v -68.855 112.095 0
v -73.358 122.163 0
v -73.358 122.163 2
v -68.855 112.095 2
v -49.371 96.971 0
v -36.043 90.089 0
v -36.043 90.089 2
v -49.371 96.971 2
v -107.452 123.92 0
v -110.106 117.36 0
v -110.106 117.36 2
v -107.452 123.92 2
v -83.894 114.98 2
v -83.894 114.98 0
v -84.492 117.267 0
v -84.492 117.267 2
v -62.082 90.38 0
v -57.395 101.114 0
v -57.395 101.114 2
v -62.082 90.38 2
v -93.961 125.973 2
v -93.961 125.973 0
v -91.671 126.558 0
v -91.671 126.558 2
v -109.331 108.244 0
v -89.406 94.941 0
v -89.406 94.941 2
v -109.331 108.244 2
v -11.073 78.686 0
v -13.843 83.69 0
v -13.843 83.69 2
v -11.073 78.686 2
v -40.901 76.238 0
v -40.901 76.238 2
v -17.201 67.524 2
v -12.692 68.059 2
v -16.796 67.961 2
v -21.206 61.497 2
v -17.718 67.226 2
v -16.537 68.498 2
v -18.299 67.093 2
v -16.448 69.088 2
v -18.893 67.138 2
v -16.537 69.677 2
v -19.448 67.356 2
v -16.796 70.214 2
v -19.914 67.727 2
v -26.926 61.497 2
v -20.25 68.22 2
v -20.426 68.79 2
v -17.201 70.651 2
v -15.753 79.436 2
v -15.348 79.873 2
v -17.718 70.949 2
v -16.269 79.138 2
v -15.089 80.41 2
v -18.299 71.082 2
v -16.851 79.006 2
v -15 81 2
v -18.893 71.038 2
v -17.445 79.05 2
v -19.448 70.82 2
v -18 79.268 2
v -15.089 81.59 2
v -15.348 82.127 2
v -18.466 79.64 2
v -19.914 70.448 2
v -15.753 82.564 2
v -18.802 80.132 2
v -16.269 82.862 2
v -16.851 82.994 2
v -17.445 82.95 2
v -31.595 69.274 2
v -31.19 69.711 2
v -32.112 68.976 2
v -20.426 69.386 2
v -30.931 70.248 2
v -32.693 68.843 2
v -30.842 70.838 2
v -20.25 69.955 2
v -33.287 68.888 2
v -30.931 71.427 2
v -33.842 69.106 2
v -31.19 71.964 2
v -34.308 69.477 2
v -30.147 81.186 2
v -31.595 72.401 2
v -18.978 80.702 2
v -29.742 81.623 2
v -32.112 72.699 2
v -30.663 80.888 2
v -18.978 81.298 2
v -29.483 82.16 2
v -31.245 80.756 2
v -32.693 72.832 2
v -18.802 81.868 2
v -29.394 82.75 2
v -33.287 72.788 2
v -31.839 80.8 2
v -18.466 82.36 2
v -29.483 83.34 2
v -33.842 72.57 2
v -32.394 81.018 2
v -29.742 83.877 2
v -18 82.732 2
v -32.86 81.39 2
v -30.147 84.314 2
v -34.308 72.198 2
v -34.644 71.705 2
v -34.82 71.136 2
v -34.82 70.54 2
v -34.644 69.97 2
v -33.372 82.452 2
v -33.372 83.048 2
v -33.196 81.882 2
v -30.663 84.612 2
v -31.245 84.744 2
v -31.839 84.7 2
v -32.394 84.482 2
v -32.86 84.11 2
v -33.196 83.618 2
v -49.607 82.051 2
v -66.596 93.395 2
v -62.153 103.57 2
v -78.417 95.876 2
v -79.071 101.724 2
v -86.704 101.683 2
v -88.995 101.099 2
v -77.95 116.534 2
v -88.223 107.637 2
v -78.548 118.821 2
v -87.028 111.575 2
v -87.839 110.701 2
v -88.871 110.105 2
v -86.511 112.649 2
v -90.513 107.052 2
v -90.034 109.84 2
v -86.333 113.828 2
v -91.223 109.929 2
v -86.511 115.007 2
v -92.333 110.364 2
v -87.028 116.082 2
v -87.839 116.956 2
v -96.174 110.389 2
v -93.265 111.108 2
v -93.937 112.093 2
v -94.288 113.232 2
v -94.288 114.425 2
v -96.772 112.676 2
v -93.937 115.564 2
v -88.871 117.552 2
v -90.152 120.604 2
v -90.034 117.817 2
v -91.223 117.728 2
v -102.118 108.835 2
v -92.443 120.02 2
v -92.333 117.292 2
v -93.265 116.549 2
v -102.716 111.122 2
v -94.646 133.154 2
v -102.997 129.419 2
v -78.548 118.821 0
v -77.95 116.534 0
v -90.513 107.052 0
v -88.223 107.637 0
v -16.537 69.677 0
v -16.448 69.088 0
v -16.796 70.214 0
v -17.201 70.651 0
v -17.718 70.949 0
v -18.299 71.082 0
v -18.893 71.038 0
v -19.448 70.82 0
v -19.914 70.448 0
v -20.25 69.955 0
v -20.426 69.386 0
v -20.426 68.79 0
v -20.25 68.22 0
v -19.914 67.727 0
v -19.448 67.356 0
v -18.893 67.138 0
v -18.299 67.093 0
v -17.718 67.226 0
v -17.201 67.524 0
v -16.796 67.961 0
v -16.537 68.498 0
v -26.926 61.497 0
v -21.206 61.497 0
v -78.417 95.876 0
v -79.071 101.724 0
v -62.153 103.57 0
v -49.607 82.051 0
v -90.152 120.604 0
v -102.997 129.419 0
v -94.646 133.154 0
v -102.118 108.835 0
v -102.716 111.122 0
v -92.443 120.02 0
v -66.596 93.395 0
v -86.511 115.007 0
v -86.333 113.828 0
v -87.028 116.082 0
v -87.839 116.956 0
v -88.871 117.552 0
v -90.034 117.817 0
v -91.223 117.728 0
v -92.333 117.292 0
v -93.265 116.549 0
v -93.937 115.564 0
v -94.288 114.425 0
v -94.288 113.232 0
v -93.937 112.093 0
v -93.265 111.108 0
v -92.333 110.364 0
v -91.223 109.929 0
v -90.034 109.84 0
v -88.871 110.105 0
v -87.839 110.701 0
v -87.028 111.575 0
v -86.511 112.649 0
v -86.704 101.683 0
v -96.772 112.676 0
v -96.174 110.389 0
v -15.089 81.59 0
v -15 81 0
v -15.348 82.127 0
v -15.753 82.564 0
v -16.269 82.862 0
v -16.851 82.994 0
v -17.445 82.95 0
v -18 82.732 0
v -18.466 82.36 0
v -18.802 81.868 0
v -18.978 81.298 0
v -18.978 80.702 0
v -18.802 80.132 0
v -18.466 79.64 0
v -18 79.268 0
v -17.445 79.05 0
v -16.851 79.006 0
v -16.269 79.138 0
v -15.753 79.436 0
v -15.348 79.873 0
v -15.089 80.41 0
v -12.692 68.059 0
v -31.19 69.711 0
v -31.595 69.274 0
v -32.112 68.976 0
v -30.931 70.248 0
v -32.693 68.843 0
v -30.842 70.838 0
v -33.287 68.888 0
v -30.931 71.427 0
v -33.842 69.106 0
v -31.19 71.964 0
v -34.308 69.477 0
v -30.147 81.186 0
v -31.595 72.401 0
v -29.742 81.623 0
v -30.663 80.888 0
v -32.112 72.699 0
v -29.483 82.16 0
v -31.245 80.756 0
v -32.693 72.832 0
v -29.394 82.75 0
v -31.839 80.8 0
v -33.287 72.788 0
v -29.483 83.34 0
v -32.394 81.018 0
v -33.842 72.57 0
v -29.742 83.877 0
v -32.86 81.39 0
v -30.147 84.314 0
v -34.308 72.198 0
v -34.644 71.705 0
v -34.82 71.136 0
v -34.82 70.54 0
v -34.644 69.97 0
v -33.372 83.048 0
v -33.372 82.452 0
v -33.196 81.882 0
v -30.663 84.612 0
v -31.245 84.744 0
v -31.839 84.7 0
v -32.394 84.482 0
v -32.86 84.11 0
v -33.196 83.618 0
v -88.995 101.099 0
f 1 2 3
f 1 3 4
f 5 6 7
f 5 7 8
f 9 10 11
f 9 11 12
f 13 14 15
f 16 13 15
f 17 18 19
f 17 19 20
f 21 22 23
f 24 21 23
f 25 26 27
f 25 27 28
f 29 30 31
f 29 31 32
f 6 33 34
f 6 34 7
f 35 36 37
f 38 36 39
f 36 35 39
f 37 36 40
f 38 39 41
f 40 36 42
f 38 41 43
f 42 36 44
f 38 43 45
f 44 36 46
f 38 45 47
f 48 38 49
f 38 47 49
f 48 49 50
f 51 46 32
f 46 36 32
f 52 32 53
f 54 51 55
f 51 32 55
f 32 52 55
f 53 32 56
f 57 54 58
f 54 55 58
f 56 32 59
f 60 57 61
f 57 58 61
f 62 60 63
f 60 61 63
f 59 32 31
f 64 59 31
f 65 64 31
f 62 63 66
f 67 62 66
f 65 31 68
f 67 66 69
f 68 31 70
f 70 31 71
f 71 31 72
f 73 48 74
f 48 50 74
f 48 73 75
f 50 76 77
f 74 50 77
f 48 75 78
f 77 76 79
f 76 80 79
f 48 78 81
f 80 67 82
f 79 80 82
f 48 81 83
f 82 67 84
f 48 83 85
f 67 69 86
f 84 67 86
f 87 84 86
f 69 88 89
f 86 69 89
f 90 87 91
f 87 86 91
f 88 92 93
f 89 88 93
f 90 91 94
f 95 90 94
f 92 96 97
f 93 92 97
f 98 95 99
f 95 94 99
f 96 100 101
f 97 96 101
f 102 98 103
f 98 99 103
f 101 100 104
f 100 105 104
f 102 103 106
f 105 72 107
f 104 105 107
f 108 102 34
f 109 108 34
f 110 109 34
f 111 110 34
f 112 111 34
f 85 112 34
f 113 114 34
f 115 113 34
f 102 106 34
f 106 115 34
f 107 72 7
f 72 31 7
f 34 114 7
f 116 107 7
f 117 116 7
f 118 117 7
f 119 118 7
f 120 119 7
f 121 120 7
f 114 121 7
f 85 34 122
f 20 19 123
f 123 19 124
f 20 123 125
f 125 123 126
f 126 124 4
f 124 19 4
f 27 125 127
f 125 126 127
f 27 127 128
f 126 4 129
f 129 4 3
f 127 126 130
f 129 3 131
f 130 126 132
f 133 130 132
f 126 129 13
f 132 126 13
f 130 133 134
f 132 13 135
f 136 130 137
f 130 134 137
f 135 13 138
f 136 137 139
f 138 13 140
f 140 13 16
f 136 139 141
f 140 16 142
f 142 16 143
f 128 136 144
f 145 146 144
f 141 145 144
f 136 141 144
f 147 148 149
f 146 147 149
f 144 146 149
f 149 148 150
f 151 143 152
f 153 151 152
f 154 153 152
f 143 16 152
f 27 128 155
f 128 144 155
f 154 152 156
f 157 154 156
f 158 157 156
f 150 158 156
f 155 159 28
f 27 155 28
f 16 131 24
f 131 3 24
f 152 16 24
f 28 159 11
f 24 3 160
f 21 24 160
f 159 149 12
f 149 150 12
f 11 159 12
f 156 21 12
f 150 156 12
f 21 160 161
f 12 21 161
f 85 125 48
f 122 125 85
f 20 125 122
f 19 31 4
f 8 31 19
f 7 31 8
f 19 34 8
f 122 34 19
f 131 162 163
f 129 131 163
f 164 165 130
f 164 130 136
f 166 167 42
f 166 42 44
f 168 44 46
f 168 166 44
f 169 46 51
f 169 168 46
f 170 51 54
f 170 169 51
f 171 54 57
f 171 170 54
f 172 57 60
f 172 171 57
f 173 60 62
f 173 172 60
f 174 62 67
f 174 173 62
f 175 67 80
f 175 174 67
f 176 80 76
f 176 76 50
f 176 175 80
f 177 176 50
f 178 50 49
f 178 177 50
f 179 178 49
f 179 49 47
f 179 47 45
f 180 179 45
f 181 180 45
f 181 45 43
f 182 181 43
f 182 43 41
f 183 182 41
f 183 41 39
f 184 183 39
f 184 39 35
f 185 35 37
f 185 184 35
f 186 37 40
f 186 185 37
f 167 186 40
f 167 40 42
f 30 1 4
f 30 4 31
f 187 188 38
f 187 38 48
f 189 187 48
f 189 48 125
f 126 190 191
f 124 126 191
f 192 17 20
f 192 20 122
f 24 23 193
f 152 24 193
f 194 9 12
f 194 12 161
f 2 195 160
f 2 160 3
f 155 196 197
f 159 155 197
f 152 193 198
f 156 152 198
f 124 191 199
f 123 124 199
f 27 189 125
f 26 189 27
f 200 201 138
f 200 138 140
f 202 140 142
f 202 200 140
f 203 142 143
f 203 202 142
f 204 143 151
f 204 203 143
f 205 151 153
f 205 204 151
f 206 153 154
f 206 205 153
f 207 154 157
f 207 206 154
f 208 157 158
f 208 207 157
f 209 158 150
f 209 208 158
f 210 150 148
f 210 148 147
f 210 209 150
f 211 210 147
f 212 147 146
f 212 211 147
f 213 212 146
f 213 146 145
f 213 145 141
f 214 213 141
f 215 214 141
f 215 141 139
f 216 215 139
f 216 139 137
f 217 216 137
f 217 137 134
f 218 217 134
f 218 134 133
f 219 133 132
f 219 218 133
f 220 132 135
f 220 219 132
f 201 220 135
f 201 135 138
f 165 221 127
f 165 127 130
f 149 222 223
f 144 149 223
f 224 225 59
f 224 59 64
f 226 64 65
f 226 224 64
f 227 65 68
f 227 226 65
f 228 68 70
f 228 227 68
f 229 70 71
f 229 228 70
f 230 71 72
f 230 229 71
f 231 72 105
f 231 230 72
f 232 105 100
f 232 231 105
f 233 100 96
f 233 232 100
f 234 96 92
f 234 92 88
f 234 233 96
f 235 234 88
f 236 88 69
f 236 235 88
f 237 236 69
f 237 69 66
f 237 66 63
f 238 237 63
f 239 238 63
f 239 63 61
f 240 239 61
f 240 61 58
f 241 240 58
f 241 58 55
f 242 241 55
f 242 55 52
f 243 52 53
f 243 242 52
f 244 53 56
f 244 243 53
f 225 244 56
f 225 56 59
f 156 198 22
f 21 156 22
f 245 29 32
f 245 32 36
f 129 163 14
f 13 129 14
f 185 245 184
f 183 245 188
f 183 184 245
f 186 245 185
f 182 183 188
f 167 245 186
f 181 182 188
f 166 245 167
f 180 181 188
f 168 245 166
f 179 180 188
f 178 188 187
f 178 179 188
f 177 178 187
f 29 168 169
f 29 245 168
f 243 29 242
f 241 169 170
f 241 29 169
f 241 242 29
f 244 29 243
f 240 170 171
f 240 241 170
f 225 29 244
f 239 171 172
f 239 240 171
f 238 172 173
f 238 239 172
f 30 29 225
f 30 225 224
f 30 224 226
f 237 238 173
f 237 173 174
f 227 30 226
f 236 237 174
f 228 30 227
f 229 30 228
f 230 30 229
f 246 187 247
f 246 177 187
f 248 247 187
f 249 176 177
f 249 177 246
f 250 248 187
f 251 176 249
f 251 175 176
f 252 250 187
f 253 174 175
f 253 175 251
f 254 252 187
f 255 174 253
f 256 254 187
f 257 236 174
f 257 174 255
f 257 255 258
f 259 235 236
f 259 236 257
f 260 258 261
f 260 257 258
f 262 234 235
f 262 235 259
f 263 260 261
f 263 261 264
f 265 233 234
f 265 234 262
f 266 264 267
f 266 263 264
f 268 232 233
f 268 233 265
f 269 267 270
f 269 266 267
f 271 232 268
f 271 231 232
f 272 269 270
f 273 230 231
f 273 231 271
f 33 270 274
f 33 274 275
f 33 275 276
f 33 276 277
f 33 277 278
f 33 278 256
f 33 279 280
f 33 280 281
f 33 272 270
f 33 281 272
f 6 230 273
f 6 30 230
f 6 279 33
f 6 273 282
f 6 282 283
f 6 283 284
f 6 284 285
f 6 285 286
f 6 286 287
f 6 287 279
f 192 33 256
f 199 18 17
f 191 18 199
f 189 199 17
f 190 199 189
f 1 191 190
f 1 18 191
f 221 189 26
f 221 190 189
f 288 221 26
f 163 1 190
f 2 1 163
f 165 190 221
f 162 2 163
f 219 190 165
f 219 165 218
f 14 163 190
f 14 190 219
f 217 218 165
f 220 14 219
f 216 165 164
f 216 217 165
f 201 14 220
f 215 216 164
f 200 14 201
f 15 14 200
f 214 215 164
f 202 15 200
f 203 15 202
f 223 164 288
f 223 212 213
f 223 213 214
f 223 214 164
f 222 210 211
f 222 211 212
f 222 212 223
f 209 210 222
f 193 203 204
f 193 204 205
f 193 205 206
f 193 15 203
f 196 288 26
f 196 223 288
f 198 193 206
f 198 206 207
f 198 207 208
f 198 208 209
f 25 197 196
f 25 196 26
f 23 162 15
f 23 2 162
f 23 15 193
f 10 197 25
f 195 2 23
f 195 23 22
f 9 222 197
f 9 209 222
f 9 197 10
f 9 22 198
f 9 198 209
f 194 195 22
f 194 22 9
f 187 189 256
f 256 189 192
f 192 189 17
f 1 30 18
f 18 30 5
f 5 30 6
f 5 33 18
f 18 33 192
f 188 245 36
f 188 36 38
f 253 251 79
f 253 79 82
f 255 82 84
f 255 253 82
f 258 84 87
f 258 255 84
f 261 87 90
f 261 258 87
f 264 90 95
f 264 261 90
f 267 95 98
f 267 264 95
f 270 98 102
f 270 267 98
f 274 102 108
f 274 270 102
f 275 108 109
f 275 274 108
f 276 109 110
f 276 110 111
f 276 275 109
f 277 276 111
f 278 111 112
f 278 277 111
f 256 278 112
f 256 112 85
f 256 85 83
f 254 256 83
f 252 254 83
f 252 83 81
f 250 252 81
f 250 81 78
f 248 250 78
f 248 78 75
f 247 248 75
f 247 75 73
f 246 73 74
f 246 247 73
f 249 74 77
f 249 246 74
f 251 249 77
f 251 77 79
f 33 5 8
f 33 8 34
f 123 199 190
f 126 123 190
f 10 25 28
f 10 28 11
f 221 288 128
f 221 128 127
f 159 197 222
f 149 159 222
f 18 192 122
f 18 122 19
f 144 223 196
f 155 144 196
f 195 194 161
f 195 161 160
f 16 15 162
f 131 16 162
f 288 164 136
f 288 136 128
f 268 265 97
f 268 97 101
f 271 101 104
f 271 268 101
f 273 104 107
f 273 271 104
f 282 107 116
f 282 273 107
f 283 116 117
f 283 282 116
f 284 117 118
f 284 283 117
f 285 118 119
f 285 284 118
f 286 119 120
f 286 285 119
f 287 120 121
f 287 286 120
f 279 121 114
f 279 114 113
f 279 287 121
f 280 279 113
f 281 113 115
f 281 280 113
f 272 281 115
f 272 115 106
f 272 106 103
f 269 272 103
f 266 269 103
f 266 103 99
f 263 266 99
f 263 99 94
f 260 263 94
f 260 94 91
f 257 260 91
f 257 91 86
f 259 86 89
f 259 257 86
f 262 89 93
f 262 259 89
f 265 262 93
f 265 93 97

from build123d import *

# Parameters (mm, degrees)
SKETCH1_R           = 4
SKETCH1_R_2         = 2
BOSS_EXTRUDE1_DEPTH = 2
CUT_EXTRUDE1_DEPTH  = 173.793238563


with BuildPart() as part:
    # Sketch1 → Boss-Extrude1 (new body)
    with BuildSketch(Plane.XY):
        Polygon((-12.69170221, 68.058974673), (-21.206087924, 61.497173254), (-26.925864701, 61.497173254), (-78.416756166, 95.875975746), (-89.405776689, 94.940877802), (-109.330638194, 108.244063256), (-110.106321881, 117.359690148), (-107.452090358, 123.920131464), (-102.997288795, 129.41913849), (-94.646003522, 133.154426043), (-73.358414132, 122.162911716), (-68.855470773, 112.095316109), (-13.842945112, 83.690457631), (-11.073314648, 78.685960307), align=None)
        with Locations((-90.332829692, 113.828343926)):
            Circle(SKETCH1_R, mode=Mode.SUBTRACT)
        with Locations((-18.448275862, 69.087716549)):
            Circle(SKETCH1_R_2, mode=Mode.SUBTRACT)
        with Locations((-32.842285033, 70.837716549)):
            Circle(SKETCH1_R_2, mode=Mode.SUBTRACT)
        with Locations((-31.39400917, 82.75)):
            Circle(SKETCH1_R_2, mode=Mode.SUBTRACT)
        with Locations((-17, 81)):
            Circle(SKETCH1_R_2, mode=Mode.SUBTRACT)
        Polygon((-102.715959344, 111.122206654), (-96.771854102, 112.676201947), (-96.173964404, 110.389245671), (-102.118069647, 108.835250378), align=None, mode=Mode.SUBTRACT)
        Polygon((-91.670790351, 126.557551491), (-90.152197928, 120.604303172), (-92.442671943, 120.0200345), (-93.961264367, 125.97328282), align=None, mode=Mode.SUBTRACT)
        Polygon((-77.94970004, 116.534481198), (-83.893805282, 114.980485905), (-84.49169498, 117.267442181), (-78.547589737, 118.821437474), align=None, mode=Mode.SUBTRACT)
        Polygon((-88.222987441, 107.636653352), (-90.513461456, 107.052384681), (-88.994869033, 101.099136361), (-86.704395017, 101.683405032), align=None, mode=Mode.SUBTRACT)
    extrude(amount=BOSS_EXTRUDE1_DEPTH)

    # Sketch5 → Cut-Extrude1 (cut, through all)
    with BuildSketch(Plane(origin=(0, 0, 0), x_dir=(-1, 0, 0), z_dir=(0, 0, -1))):
        Polygon((40.900602426, 76.238480364), (36.043275579, 90.088799545), (49.371469789, 96.970604475), align=None)
        Polygon((49.606538592, 82.051152303), (57.395163154, 101.113513236), (62.081526665, 90.380298271), align=None)
        Polygon((62.153457083, 103.570383994), (66.596381061, 93.394720495), (79.071369134, 101.723866464), align=None)
    extrude(amount=-CUT_EXTRUDE1_DEPTH, mode=Mode.SUBTRACT)


solid = part.part
